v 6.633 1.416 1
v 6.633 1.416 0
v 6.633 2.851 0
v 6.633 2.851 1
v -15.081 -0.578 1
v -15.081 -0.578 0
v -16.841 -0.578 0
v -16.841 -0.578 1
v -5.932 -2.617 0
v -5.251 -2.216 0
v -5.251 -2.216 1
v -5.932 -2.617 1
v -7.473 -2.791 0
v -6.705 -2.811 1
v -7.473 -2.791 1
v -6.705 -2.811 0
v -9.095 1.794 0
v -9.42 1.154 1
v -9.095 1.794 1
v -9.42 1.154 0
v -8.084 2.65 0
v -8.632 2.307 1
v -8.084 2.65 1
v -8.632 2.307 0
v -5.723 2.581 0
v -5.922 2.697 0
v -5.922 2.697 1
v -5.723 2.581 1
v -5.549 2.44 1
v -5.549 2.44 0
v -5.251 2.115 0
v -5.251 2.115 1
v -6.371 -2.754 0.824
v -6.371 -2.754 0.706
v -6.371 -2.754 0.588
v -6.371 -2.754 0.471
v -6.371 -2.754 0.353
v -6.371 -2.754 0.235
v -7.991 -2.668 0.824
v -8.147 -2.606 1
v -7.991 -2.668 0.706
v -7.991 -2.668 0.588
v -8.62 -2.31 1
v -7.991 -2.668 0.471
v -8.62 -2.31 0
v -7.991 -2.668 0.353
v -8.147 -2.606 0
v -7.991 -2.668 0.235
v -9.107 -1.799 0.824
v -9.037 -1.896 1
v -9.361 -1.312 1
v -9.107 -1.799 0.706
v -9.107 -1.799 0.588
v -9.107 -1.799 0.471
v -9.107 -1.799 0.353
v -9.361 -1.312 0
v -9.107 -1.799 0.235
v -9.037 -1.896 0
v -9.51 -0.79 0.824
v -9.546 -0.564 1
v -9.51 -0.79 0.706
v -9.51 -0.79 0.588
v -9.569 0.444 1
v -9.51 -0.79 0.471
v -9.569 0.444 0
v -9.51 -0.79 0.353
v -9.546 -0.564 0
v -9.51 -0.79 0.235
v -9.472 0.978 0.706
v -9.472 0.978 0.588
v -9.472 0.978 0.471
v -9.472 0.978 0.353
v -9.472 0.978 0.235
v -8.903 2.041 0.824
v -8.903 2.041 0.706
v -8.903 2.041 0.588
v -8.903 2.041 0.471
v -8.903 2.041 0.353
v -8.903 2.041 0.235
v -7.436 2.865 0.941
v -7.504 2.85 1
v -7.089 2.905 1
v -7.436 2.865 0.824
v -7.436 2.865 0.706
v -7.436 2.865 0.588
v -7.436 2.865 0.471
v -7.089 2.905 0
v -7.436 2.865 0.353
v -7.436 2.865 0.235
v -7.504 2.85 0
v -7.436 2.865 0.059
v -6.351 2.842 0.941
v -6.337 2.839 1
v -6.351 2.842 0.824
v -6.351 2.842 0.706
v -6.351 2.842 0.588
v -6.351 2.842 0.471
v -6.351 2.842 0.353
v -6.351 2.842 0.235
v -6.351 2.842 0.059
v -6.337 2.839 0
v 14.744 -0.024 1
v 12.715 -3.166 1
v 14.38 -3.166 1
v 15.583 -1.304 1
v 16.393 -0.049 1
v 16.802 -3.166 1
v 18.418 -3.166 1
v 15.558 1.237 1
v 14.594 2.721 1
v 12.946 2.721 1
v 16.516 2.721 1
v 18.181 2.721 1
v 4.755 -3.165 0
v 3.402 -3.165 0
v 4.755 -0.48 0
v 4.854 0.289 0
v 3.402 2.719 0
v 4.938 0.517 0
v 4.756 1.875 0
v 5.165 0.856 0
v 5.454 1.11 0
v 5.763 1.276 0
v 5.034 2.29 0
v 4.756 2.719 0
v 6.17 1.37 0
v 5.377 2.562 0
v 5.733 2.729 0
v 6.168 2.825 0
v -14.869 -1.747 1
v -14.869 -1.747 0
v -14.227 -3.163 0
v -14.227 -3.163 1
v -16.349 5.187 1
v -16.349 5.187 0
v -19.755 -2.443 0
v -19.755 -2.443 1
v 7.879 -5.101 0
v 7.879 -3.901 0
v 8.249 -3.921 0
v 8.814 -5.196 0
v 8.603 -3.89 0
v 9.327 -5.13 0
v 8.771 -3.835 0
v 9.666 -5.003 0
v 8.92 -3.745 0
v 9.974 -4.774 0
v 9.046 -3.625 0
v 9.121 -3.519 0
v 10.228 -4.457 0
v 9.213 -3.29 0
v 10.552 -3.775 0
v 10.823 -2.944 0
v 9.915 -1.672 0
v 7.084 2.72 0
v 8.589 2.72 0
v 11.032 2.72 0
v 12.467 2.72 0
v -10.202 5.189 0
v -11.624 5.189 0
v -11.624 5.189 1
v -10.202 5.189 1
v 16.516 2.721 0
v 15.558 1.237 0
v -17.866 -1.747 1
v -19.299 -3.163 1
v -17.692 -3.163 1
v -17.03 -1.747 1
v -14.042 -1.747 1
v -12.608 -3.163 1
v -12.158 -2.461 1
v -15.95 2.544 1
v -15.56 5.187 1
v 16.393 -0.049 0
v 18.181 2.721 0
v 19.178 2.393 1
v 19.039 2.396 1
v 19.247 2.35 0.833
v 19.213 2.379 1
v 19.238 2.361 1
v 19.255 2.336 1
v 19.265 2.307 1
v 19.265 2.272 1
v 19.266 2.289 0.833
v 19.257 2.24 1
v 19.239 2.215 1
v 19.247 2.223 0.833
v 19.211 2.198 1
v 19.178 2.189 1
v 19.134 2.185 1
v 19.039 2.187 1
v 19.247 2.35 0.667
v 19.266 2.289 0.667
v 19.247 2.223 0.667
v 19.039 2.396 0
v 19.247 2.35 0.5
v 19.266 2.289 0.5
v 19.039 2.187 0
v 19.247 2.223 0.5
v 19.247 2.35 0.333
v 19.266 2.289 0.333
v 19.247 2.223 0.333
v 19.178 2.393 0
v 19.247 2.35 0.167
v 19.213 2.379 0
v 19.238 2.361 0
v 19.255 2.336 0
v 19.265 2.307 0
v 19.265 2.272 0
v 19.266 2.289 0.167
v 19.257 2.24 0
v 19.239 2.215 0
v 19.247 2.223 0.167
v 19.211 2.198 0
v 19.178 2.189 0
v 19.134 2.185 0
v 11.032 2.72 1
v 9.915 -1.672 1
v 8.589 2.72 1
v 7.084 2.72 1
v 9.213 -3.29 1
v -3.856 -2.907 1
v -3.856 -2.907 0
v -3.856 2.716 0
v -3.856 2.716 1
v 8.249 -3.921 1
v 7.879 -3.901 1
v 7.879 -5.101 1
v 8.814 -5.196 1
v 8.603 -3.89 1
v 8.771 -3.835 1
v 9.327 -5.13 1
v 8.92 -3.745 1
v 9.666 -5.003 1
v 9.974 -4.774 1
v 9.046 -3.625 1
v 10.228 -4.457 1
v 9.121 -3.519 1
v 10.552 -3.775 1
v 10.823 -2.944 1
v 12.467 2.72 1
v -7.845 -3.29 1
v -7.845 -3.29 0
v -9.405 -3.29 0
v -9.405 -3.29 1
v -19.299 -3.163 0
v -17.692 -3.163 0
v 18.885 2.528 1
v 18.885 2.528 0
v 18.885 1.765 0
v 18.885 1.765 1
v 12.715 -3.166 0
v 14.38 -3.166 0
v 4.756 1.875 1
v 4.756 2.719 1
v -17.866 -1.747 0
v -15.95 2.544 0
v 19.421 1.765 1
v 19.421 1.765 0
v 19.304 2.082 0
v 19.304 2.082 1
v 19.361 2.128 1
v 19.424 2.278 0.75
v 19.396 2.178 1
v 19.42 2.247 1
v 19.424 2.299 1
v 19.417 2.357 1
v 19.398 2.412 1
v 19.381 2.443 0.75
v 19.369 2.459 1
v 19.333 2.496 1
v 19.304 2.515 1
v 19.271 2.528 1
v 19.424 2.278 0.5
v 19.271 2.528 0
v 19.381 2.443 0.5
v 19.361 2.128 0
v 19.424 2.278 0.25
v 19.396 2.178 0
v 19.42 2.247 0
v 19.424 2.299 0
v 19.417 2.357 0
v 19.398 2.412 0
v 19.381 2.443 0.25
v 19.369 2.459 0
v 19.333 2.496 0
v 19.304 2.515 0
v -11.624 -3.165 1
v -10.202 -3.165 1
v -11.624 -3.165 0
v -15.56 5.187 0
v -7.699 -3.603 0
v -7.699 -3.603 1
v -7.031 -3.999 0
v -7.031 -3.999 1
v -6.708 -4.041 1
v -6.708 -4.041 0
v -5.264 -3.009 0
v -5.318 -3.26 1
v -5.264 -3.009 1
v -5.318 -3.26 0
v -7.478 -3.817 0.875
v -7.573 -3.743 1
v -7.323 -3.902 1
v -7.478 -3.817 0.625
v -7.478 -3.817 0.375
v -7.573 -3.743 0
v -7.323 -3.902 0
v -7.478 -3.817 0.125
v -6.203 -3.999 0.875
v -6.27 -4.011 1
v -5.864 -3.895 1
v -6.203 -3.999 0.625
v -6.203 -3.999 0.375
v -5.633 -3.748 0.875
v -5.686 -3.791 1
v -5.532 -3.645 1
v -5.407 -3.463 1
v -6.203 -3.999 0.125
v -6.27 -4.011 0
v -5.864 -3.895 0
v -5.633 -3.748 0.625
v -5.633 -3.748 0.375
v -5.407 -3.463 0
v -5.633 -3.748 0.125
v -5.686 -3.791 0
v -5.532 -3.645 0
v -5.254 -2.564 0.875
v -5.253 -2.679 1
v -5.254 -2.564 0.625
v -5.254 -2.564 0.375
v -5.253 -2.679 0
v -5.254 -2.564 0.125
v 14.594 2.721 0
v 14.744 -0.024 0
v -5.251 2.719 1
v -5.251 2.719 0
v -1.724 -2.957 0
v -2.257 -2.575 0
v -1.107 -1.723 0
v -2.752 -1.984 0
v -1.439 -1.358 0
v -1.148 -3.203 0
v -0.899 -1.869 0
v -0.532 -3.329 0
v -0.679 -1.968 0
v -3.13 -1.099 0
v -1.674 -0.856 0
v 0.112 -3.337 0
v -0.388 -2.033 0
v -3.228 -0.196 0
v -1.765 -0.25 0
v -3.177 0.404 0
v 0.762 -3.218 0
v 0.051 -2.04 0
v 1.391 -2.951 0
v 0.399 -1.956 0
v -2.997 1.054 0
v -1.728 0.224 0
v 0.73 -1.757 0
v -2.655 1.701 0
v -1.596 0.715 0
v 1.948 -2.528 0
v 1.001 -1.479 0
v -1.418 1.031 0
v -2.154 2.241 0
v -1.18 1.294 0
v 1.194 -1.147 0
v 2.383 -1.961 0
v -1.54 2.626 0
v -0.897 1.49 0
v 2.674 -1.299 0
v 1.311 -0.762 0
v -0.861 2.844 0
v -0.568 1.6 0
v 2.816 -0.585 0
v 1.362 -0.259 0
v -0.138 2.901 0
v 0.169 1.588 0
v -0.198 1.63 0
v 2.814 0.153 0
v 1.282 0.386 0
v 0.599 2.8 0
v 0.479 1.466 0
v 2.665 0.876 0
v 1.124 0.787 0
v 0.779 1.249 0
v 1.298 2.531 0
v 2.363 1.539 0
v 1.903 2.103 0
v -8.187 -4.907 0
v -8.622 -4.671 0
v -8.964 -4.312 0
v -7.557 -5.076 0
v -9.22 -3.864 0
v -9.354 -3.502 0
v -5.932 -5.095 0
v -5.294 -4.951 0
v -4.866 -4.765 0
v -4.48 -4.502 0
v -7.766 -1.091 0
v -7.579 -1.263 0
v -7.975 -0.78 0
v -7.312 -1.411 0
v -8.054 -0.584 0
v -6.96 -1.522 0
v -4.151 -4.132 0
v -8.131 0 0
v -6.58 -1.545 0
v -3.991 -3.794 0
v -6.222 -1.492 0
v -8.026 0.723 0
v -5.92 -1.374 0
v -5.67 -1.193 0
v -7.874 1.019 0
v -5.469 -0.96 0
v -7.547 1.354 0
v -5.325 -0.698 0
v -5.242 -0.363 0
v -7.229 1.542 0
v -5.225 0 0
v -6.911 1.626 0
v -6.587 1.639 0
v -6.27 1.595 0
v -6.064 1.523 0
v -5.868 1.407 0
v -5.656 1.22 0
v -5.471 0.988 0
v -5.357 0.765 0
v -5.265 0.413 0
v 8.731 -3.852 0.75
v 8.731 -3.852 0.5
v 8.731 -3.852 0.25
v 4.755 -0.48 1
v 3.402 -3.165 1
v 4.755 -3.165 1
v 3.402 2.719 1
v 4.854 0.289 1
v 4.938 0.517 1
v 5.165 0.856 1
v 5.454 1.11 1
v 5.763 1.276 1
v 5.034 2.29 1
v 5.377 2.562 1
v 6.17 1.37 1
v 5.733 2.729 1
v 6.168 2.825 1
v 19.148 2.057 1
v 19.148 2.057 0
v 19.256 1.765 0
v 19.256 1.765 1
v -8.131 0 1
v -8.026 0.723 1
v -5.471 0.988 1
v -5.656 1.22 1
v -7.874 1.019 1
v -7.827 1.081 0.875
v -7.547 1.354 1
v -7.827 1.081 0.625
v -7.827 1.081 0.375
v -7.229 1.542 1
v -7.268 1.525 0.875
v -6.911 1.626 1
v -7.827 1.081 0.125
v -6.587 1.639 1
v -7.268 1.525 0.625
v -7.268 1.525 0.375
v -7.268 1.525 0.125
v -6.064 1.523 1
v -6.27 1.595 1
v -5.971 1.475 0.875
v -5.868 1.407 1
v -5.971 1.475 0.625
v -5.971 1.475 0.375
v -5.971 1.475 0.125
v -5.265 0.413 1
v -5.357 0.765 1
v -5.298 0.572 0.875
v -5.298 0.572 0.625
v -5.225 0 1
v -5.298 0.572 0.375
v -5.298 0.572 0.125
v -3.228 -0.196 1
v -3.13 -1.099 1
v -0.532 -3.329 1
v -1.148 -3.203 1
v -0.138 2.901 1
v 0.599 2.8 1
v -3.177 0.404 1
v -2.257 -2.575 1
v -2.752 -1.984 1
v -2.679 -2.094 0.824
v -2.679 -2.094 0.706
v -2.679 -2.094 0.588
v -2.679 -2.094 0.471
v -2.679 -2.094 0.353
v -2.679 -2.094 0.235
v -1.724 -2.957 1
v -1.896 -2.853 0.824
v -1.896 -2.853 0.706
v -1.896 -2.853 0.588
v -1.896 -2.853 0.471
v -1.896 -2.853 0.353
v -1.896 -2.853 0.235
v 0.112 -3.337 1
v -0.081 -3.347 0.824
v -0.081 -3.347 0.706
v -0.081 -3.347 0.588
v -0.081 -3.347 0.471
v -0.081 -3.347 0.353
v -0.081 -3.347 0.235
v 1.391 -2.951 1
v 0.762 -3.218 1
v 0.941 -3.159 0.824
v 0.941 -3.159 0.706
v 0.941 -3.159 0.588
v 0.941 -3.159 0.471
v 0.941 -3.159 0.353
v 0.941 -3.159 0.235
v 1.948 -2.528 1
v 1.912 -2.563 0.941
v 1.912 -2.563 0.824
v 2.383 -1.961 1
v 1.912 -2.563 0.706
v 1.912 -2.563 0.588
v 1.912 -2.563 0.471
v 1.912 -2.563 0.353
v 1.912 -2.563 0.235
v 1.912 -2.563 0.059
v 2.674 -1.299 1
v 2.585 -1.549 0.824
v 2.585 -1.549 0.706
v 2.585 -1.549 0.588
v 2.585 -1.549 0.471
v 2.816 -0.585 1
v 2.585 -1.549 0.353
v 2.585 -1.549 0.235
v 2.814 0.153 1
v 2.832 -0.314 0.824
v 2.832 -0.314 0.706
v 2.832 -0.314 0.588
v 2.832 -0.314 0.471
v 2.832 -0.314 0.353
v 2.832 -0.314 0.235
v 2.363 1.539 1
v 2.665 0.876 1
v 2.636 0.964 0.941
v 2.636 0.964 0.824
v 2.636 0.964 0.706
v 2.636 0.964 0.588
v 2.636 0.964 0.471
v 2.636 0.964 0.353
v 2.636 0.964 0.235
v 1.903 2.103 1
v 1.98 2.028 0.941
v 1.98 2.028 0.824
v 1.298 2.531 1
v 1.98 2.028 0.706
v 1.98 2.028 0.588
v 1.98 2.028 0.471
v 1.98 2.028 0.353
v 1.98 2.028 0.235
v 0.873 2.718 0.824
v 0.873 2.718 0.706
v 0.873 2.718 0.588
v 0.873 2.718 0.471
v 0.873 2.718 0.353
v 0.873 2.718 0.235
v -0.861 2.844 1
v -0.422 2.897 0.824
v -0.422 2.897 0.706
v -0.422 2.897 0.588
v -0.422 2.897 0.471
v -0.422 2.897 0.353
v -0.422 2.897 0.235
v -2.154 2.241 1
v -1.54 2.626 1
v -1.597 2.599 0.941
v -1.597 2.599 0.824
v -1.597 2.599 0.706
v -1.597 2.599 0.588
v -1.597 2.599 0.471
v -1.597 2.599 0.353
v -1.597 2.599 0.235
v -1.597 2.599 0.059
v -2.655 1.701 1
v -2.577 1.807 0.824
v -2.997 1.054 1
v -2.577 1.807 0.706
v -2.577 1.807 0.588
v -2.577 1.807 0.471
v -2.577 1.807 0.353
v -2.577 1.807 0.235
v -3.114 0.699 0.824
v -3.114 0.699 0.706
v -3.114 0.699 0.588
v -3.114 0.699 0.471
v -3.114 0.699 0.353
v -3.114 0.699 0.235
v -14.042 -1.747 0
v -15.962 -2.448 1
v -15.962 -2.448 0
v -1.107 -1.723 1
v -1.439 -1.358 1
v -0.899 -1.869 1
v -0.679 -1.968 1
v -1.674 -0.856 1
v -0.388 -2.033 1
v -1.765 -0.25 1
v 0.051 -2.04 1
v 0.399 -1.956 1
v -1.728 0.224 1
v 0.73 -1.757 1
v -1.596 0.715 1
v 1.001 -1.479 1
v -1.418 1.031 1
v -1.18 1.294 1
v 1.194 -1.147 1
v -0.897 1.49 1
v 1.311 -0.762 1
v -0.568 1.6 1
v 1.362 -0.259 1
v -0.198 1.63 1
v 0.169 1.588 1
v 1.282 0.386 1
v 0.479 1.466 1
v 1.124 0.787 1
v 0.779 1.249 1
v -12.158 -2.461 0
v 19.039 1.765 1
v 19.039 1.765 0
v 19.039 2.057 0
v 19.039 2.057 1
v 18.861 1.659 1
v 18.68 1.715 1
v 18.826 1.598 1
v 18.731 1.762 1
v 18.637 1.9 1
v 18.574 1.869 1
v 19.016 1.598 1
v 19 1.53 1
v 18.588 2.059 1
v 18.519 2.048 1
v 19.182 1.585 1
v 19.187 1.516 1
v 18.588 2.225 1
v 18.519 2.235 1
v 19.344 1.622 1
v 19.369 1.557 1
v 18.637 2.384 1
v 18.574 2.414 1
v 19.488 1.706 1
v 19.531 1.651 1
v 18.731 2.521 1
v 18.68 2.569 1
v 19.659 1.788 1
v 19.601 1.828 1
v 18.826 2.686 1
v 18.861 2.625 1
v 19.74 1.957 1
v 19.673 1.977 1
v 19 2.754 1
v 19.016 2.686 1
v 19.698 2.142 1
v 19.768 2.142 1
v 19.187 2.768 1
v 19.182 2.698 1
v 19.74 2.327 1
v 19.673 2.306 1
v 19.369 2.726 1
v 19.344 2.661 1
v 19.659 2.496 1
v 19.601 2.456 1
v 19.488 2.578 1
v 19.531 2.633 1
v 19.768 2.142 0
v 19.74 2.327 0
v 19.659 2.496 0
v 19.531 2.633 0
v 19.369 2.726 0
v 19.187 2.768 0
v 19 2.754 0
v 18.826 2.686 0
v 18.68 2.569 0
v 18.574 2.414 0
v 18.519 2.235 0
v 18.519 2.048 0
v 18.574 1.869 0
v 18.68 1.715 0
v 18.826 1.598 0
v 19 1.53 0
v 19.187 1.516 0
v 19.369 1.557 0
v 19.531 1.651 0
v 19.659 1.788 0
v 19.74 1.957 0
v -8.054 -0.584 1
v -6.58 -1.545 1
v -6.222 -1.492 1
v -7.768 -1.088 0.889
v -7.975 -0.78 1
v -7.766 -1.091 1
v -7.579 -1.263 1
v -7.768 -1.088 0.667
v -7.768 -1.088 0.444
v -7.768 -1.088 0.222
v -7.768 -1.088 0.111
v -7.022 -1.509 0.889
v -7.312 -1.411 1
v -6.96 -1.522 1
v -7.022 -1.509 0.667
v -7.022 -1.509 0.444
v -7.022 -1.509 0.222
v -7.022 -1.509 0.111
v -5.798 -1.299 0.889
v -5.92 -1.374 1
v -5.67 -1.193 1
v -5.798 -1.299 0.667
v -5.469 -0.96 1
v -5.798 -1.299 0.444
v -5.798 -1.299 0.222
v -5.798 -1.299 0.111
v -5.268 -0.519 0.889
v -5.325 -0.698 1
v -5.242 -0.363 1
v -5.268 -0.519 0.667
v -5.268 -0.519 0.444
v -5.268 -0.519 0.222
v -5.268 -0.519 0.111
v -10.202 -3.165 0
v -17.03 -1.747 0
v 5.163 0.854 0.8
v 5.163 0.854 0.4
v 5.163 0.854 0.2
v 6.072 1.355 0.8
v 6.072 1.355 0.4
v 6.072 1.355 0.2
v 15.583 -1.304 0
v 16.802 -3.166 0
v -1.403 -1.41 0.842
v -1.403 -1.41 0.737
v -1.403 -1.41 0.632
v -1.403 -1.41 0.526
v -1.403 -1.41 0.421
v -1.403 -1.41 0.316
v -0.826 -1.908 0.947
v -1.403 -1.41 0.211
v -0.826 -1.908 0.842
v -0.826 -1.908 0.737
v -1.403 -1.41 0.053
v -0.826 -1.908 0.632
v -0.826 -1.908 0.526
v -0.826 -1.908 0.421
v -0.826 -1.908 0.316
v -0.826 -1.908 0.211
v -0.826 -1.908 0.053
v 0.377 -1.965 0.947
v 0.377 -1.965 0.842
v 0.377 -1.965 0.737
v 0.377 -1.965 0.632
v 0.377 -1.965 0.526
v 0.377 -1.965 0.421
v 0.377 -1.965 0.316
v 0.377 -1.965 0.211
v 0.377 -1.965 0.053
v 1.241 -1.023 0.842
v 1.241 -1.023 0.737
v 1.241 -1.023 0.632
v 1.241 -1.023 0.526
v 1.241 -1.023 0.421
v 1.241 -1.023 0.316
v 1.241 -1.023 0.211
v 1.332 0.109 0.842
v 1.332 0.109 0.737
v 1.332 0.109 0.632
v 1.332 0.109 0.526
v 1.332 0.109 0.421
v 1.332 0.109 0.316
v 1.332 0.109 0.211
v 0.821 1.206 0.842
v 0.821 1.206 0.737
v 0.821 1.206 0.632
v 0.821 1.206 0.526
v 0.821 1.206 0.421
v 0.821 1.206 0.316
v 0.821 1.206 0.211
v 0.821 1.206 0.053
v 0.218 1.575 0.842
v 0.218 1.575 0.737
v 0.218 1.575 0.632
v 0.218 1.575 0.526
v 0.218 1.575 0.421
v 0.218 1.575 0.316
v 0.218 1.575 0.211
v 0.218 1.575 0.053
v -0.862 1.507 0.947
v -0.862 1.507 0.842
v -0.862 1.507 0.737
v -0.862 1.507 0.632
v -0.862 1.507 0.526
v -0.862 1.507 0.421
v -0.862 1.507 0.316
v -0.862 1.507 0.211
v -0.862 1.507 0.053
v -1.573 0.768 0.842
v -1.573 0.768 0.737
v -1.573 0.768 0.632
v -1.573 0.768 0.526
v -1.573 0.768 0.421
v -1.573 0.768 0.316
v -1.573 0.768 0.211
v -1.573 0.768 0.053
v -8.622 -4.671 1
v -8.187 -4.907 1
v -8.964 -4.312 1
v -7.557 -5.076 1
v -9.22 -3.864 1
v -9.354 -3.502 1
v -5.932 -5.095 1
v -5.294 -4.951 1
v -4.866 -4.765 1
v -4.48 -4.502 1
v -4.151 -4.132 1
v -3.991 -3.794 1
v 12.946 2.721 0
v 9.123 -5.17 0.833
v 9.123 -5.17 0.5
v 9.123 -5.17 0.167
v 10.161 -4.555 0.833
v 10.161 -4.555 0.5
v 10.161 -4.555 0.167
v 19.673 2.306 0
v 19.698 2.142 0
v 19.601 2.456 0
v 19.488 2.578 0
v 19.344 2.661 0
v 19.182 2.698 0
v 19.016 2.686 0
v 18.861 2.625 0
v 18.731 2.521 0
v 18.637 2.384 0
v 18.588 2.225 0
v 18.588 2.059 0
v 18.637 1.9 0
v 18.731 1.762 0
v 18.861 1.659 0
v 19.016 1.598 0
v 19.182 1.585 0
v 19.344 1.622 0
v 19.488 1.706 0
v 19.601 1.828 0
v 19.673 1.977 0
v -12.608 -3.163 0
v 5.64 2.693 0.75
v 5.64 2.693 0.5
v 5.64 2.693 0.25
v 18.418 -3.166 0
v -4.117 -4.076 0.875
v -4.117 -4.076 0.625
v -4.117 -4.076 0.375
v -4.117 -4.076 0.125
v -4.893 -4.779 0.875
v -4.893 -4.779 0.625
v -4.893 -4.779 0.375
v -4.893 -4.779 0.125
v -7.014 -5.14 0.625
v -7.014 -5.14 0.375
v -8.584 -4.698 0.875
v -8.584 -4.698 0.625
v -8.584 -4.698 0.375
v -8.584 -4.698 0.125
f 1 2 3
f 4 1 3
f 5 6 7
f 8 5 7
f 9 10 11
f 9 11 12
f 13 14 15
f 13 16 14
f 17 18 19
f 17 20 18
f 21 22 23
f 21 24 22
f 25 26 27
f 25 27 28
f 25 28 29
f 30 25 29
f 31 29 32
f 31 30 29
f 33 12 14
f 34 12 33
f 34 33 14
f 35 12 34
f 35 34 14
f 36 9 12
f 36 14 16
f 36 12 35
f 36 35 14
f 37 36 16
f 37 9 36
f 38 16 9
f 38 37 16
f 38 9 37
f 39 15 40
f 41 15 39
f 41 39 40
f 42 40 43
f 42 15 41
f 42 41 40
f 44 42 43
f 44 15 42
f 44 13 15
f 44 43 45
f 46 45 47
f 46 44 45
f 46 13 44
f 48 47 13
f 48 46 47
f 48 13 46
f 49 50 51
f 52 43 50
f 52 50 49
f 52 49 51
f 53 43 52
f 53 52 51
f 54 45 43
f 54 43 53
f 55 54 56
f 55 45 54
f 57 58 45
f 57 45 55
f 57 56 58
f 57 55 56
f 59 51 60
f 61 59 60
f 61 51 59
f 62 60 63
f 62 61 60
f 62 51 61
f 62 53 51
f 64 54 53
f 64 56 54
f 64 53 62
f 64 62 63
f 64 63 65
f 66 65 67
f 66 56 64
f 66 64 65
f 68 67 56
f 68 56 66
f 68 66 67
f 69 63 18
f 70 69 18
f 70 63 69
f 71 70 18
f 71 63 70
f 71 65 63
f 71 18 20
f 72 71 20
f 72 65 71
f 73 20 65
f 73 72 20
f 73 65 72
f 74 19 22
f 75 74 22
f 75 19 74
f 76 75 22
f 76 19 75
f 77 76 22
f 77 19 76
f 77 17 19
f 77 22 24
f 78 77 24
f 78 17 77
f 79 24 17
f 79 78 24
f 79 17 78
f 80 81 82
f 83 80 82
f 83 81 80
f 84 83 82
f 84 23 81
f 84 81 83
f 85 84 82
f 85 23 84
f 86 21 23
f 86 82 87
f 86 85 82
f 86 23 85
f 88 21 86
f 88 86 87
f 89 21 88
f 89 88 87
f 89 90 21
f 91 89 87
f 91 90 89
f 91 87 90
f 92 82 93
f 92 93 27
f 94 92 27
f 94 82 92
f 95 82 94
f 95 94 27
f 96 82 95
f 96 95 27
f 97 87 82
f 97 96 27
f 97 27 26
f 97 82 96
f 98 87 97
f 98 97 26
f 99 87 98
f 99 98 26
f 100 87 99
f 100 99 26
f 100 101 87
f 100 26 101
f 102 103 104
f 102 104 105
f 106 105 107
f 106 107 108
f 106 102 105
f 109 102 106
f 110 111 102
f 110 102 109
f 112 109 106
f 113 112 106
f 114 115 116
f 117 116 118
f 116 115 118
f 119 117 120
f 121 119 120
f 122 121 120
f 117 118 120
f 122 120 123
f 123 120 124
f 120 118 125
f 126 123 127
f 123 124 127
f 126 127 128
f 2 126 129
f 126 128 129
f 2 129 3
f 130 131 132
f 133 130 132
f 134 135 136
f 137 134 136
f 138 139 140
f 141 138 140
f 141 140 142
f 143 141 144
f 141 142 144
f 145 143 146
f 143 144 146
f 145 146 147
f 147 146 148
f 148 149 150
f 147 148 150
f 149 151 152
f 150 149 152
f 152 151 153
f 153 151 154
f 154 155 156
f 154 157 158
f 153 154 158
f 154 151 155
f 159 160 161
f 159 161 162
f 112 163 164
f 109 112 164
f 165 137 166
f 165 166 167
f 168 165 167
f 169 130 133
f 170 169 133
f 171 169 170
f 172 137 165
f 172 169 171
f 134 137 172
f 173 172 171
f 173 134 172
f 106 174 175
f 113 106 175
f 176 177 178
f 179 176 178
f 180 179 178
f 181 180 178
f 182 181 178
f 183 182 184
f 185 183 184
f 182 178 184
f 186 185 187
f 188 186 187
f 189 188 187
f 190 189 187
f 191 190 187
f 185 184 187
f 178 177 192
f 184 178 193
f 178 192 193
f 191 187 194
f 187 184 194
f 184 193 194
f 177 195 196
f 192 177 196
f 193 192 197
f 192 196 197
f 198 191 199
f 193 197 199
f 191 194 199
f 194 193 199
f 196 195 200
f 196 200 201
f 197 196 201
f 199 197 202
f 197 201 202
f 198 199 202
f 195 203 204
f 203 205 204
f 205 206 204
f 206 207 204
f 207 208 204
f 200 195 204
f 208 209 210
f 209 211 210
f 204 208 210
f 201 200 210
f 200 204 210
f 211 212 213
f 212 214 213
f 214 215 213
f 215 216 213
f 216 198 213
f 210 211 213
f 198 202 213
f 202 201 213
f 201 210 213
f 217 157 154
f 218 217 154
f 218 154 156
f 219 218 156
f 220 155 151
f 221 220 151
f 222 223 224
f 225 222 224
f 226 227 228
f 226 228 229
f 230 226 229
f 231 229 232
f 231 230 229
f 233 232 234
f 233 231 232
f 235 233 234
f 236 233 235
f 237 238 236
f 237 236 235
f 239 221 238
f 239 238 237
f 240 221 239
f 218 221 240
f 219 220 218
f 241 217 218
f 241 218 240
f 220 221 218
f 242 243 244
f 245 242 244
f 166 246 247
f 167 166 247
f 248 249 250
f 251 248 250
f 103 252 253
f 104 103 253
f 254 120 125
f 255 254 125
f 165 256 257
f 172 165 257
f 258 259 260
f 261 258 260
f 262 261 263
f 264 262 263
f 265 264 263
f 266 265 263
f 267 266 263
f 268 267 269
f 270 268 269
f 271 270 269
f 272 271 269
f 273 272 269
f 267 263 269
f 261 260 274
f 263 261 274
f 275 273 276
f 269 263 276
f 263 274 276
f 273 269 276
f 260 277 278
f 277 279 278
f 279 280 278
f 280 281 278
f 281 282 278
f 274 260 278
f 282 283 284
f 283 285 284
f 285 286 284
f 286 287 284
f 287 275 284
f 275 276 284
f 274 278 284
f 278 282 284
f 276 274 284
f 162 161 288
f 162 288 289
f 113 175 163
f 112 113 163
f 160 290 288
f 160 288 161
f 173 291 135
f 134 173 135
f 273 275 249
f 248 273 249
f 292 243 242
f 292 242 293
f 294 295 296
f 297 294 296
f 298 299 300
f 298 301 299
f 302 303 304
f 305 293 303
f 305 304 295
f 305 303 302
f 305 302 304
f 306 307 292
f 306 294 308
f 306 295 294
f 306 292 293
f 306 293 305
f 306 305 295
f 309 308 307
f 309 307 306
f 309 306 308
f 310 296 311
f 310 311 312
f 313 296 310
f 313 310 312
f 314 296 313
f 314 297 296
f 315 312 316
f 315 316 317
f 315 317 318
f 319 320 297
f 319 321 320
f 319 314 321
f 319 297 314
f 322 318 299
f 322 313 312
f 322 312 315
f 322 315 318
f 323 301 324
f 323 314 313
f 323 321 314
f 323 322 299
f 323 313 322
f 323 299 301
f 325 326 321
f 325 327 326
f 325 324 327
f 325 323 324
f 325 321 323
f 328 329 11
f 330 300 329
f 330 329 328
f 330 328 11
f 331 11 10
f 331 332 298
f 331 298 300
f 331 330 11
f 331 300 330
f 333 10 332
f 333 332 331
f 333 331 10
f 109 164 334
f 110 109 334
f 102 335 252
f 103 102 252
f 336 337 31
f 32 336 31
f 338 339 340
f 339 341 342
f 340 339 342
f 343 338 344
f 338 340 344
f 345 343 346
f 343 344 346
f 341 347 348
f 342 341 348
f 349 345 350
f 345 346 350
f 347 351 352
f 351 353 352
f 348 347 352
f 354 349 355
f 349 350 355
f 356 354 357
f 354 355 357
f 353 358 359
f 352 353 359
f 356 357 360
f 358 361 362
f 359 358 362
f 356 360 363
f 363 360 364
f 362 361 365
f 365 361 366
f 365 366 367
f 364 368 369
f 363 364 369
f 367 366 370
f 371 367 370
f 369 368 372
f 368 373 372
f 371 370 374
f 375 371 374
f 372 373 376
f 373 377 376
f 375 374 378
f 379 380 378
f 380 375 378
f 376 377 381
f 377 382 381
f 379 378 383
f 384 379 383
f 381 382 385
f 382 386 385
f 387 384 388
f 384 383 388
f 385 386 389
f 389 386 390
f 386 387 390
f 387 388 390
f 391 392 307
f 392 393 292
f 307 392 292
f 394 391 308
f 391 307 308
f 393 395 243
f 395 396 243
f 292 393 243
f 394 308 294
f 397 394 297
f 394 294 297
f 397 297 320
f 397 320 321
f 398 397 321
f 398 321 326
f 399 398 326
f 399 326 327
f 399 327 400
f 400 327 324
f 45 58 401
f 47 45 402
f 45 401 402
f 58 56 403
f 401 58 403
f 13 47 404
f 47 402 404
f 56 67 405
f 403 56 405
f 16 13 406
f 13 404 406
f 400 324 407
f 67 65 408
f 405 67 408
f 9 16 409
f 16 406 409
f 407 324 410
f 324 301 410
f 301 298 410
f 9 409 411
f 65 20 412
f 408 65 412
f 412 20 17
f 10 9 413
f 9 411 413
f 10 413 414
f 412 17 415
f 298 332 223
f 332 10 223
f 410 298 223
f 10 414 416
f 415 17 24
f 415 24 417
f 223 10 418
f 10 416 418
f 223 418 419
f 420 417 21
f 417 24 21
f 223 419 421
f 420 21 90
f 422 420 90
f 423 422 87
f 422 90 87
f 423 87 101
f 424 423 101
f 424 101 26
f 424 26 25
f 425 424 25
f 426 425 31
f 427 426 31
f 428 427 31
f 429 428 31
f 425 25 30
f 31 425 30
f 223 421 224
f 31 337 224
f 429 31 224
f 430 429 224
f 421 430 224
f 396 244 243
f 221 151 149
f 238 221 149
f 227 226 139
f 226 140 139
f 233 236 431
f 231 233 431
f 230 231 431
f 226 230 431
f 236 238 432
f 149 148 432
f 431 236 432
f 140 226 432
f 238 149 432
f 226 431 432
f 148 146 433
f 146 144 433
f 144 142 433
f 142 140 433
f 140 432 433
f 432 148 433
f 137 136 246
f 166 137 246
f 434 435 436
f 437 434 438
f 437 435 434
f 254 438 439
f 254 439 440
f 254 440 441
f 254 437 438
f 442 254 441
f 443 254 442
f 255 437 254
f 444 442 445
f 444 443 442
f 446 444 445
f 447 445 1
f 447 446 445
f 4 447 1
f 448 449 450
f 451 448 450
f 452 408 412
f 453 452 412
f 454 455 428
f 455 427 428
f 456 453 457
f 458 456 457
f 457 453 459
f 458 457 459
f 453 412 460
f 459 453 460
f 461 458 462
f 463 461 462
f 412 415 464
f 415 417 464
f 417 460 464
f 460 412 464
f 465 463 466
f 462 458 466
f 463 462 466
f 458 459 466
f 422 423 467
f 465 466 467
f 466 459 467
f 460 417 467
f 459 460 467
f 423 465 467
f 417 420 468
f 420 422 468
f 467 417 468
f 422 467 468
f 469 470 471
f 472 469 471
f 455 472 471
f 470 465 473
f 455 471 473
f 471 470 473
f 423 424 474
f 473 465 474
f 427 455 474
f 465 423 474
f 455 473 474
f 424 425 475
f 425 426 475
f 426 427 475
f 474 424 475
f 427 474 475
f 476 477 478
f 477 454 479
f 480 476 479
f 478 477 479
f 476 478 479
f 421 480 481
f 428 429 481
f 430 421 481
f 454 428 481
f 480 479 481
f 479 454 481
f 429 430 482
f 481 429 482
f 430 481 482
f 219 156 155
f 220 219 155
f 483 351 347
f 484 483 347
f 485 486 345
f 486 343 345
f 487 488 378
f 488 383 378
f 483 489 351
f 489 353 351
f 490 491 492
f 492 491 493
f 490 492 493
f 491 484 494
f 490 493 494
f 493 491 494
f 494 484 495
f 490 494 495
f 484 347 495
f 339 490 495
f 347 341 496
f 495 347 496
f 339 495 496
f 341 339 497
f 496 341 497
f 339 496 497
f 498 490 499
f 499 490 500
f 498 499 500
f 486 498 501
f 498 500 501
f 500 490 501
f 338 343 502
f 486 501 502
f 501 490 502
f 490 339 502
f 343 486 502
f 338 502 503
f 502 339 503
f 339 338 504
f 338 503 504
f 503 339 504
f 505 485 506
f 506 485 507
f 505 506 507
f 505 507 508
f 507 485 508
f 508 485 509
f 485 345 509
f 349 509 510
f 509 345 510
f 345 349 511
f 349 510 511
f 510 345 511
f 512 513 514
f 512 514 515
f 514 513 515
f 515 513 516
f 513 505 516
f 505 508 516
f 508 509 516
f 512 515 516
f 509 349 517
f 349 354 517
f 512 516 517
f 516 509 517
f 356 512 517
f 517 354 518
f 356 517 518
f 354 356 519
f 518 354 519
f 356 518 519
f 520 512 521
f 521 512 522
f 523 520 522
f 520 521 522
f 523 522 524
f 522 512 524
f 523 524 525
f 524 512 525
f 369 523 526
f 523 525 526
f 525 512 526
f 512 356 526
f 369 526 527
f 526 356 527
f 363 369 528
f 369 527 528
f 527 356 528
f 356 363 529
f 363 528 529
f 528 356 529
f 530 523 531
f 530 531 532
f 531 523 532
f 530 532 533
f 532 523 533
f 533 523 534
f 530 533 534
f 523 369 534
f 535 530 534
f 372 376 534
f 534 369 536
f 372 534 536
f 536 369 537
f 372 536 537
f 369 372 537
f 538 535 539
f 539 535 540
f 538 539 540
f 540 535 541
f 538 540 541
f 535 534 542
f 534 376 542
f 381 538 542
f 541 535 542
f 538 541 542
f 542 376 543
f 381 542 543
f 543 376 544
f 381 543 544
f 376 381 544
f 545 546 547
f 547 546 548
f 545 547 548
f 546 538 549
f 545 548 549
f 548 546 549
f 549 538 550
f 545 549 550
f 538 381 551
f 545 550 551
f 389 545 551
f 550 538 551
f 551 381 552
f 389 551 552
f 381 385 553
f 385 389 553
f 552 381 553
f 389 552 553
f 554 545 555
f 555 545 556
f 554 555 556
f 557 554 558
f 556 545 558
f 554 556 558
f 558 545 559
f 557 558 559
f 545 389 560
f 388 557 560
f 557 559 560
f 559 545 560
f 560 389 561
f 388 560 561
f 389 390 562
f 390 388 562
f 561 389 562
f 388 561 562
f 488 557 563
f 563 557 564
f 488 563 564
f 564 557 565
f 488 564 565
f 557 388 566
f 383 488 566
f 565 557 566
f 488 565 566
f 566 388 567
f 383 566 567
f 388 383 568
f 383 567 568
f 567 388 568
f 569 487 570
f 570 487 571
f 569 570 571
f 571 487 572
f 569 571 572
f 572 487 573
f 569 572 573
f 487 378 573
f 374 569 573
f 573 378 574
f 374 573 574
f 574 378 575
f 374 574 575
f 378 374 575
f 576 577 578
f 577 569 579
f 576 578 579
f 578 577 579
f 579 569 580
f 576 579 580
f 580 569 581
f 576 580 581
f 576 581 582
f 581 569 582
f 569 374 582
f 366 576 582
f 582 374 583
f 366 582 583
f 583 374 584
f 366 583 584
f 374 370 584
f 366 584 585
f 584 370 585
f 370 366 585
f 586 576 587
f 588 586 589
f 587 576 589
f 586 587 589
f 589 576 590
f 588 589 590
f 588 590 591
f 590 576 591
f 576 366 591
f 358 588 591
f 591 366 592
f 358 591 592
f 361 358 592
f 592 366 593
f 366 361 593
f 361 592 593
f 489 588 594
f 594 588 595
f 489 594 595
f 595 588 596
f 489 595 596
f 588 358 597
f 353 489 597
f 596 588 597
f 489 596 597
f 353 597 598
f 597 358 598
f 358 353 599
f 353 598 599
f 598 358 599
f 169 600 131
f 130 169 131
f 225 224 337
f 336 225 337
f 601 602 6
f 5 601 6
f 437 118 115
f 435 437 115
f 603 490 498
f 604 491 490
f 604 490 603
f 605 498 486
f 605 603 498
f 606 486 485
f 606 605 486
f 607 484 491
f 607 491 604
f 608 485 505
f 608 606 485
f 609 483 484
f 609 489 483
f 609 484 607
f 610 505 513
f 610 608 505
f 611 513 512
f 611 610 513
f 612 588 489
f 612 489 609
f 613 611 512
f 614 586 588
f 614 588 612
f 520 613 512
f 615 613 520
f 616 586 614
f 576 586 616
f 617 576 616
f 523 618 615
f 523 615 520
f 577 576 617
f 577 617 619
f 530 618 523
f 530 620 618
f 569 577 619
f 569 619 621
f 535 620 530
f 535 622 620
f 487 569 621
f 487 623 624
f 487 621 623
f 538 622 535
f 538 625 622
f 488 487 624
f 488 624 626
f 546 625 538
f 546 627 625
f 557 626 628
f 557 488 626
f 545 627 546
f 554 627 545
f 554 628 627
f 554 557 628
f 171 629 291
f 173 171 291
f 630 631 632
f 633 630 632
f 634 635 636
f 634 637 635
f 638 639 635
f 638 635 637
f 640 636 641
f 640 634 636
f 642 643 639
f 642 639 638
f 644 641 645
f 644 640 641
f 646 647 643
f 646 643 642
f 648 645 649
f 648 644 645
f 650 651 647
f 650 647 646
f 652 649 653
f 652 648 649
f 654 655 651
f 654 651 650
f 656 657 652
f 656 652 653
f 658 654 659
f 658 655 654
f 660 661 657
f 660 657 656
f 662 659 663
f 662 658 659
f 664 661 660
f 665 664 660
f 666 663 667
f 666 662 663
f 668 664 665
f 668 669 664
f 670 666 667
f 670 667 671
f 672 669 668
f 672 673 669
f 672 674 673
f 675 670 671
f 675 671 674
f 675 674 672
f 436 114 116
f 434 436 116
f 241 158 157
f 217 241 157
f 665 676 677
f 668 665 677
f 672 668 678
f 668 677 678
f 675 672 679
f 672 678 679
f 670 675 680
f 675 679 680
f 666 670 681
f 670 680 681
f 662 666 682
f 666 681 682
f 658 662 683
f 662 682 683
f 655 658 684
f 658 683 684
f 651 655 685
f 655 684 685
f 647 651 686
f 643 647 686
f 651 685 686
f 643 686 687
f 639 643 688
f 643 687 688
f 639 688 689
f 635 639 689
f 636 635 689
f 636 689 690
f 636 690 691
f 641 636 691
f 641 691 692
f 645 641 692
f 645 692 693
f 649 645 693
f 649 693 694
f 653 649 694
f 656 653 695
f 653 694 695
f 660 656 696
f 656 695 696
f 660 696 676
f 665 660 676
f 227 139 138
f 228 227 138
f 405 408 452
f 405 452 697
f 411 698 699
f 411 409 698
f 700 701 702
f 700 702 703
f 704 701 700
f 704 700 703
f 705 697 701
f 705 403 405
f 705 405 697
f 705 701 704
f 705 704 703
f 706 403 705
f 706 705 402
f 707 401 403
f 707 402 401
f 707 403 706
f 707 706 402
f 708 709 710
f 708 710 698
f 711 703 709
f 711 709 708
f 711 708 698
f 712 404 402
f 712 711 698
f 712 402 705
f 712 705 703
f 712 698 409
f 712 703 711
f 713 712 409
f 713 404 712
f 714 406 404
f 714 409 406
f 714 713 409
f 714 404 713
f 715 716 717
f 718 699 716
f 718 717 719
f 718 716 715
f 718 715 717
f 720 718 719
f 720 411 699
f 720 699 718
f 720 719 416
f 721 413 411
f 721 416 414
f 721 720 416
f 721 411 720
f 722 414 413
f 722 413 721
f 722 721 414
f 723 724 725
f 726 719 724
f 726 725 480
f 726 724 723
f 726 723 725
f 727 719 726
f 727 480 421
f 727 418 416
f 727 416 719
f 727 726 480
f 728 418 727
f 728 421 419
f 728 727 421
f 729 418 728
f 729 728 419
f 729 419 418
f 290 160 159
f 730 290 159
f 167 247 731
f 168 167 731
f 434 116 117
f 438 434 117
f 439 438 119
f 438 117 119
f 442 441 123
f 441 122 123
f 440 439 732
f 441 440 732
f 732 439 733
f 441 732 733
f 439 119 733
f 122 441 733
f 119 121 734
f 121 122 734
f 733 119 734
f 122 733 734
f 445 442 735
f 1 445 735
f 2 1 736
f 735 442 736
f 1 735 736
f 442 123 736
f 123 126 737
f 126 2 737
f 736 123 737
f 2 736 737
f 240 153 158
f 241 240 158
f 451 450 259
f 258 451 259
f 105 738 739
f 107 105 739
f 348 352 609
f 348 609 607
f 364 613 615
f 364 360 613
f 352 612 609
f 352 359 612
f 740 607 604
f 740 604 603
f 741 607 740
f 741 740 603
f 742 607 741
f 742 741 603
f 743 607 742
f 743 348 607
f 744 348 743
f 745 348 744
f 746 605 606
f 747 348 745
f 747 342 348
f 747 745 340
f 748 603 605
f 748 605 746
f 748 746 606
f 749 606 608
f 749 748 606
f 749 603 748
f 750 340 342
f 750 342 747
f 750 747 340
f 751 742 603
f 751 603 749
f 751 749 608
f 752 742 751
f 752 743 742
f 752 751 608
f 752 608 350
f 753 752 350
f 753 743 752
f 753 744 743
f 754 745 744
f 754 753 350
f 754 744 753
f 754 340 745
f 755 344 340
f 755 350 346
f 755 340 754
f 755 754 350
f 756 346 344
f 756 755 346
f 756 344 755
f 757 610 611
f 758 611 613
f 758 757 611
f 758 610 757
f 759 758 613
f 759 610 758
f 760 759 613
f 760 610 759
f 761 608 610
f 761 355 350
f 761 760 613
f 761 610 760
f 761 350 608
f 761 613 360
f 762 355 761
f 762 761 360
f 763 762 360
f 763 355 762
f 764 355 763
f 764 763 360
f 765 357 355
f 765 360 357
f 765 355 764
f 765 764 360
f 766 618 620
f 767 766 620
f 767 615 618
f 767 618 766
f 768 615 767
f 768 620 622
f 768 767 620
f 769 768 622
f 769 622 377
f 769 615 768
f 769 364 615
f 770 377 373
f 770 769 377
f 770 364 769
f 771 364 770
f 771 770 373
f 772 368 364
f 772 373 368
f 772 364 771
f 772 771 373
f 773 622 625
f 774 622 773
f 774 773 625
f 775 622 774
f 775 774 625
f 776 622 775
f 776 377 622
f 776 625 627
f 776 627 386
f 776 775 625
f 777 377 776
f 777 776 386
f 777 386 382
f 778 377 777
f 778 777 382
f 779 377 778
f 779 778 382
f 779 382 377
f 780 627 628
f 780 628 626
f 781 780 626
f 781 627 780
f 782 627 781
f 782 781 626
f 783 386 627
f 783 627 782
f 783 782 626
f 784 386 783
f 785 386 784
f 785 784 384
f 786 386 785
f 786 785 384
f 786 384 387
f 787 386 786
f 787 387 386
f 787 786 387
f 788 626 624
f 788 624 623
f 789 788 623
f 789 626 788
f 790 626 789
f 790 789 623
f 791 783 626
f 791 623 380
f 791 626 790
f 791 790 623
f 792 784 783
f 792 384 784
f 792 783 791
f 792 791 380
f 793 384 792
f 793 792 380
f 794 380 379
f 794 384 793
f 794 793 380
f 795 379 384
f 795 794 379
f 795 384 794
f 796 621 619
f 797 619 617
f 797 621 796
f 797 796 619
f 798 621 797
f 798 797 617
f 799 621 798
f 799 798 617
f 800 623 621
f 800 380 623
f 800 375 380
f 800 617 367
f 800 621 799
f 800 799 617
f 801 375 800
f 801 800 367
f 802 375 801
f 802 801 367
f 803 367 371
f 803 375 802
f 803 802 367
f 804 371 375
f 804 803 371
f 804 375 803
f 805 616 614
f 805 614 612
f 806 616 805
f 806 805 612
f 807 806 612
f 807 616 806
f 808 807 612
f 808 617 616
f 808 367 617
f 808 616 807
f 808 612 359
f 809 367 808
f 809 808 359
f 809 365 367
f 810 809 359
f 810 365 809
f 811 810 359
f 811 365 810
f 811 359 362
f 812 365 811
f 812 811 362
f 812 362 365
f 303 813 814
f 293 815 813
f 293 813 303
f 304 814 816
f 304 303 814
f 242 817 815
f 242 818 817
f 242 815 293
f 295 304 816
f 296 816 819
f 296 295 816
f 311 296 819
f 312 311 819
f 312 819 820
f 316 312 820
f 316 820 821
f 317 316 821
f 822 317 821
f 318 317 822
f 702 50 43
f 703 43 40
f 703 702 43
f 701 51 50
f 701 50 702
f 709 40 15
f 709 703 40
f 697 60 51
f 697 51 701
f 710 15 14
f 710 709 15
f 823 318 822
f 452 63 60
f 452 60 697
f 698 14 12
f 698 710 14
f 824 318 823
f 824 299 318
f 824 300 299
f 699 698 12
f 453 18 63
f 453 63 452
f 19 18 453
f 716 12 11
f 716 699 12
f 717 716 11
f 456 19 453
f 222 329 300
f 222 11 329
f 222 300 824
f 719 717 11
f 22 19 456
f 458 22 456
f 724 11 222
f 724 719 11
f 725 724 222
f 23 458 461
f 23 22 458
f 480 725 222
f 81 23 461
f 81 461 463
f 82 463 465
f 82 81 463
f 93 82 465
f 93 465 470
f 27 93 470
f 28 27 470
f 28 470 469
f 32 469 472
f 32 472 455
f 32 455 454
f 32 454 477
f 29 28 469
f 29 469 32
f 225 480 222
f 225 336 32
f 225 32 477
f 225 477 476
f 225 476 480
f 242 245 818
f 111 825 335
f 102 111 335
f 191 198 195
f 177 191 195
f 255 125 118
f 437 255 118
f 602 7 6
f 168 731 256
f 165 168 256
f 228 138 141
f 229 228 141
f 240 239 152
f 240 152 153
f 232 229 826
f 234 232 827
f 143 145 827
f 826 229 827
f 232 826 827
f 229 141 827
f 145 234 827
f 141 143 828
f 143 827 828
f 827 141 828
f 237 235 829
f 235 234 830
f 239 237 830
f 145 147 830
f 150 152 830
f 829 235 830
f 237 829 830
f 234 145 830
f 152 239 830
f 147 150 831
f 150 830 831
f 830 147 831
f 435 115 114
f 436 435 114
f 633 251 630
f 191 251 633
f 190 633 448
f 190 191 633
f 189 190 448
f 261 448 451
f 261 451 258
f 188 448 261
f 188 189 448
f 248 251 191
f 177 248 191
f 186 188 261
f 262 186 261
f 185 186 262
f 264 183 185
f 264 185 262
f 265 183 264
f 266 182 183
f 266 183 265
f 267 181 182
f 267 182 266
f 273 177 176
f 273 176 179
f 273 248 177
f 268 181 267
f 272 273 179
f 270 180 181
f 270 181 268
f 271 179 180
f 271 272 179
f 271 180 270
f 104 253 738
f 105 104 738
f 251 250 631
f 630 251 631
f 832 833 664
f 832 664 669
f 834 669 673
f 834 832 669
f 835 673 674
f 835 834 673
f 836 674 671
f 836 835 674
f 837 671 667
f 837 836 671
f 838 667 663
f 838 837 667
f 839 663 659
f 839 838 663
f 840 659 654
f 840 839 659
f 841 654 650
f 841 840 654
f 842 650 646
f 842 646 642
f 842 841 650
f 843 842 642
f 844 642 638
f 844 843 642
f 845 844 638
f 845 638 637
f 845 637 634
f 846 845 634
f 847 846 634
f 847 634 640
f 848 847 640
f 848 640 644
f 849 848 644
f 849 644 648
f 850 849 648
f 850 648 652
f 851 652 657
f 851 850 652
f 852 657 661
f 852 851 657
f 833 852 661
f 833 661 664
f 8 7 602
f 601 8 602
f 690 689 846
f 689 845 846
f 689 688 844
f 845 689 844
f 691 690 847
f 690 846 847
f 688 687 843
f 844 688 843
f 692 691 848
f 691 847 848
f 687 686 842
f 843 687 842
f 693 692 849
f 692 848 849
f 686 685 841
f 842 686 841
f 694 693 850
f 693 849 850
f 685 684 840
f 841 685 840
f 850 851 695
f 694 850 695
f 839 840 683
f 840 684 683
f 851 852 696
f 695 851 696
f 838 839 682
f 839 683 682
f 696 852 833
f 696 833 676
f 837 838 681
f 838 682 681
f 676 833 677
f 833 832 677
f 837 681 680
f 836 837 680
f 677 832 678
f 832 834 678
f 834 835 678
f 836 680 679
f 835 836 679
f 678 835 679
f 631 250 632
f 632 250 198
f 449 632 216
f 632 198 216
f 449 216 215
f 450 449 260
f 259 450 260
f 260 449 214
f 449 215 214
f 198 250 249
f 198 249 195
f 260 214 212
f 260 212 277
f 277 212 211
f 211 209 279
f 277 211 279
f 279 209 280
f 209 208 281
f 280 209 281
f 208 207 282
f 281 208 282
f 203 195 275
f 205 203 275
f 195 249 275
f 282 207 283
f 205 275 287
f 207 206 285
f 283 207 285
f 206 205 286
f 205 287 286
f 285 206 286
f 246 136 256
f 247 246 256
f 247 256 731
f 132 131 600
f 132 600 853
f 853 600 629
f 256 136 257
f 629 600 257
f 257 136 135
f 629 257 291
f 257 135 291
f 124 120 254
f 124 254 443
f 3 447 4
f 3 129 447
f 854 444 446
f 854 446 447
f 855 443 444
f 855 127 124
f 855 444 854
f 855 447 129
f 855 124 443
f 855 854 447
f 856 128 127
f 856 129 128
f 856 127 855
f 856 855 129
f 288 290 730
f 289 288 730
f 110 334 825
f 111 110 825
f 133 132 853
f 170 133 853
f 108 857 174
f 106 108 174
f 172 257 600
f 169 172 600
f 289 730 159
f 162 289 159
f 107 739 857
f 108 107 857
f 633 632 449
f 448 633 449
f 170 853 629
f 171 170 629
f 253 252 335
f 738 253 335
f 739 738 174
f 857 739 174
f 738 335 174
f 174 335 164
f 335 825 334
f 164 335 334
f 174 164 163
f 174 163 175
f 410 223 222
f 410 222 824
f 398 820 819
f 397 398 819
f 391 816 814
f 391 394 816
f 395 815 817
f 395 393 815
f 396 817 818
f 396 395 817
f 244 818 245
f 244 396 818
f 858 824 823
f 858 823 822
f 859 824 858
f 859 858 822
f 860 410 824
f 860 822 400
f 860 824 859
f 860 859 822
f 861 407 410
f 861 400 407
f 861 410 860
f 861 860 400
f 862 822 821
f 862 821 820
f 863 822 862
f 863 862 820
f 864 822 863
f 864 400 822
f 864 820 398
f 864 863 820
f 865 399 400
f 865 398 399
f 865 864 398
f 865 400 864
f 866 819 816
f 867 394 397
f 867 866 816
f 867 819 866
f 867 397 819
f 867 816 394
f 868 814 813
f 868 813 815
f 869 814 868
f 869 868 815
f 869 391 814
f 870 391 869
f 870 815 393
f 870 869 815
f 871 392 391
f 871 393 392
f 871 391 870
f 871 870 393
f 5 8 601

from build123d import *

# Parameters (mm, degrees)
F1_DEPTH = 1
F0_W     = 1.4222441241
F0_H     = 8.3537010942
F0_R     = 0.6279237331
F0_R_2   = 0.5579662235


with BuildPart() as f1:
    # F0 (on Top) → F1 (new body)
    with BuildSketch(Plane.XY):
        Polygon((-16.3488443941, 5.1873927005), (-19.7549946606, -2.4434113875), (-19.2986354232, -3.1626098789), (-17.6923759282, -3.1626098789), (-17.0299634337, -1.7472400796), (-17.8658995365, -1.7472400796), (-15.9504826335, 2.5438715831), (-14.0423420817, -1.7472400796), (-14.868805185, -1.7472400796), (-14.2271183431, -3.1626098789), (-12.6078501344, -3.1626098789), (-12.1584273875, -2.4611647241), (-15.5595326796, 5.1873927005), align=None)
    extrude(amount=F1_DEPTH)


with BuildPart() as f1b:
    # F0 (on Top) → F1, piece 2 (new body)
    with BuildSketch(Plane.XY):
        Polygon((-15.0812519714, -0.5779869971), (-16.8408062309, -0.5779869971), (-15.9615054727, -2.4477490224), align=None)
    extrude(amount=F1_DEPTH)


with BuildPart() as f1c:
    # F0 (on Top) → F1, piece 3 (new body)
    with BuildSketch(Plane.XY):
        with Locations((-10.9128146432, 1.0118944338)):
            Rectangle(F0_W, F0_H)
    extrude(amount=F1_DEPTH)


with BuildPart() as f1d:
    # F0 (on Top) → F1, piece 4 (new body)
    with BuildSketch(Plane.XY):
        with BuildLine():
            Line((-3.8558838423, -2.9073522892), (-3.8558838423, 2.7157925069))
            Line((-3.8558838423, 2.7157925069), (-5.250770133, 2.7191238478))
            Line((-5.250770133, 2.7191238478), (-5.250770133, 2.114744857))
            add(Edge.make_bspline(
                [(-5.250770133, -2.21574842), (-5.3920497055, -2.3193948492), (-5.6946541855, -2.5413934954), (-6.3790656755, -2.7866941034), (-7.1051137086, -2.8602071713), (-8.0102576587, -2.7169133708), (-8.6015221372, -2.3544268543), (-9.1727736402, -1.8164485211), (-9.5852897605, -0.8186467774), (-9.6033932944, 0.4374854815), (-9.4794880443, 0.9700036227), (-9.3367298672, 1.4304664875), (-8.9244721778, 2.0867692527), (-8.2561392645, 2.6313242637), (-7.4377129187, 2.8831253052), (-7.0734814674, 2.9149319819), (-6.3262880802, 2.8850689099), (-5.6641554038, 2.6030605841), (-5.3853377112, 2.2737042332), (-5.250770133, 2.114744857)],
                knots=[0, 0, 0, 0, 0.0509808047, 0.1091949785, 0.1688688096, 0.2342796744, 0.2914313499, 0.3512568062, 0.423367386, 0.5006161822, 0.5510785071, 0.5979317658, 0.6580649527, 0.7233611476, 0.7858093604, 0.8279922974, 0.8866651967, 0.9453004942, 1, 1, 1, 1], degree=3))
            add(Edge.make_bspline(
                [(-7.8452127054, -3.2898520585), (-7.8117121152, -3.3831675635), (-7.7435240544, -3.5730925913), (-7.4874653887, -3.8554136407), (-6.9104396614, -4.0701135923), (-6.198994273, -4.0312870769), (-5.5879318648, -3.8138385071), (-5.2278102971, -3.1809543087), (-5.2632398781, -2.6049119269), (-5.2475925603, -2.2731449662), (-5.250770133, -2.21574842)],
                knots=[0, 0, 0, 0, 0.0943787743, 0.1989056201, 0.3336805651, 0.4809450615, 0.6184027203, 0.7611149971, 0.8970689785, 1, 1, 1, 1], degree=3))
            Line((-7.8452127054, -3.2898520585), (-9.4050969929, -3.2898520585))
            add(Edge.make_bspline(
                [(-3.8558838423, -2.9073522892), (-3.8733207039, -3.3527132004), (-3.9847479517, -4.1270394232), (-4.878725911, -4.8580095844), (-5.9263591333, -5.1508891121), (-7.0285458213, -5.145199471), (-7.2181353727, -5.1233724342), (-8.7880057279, -4.9396309996), (-9.3461702362, -3.6012559191), (-9.3878459006, -3.3657068367), (-9.4050969929, -3.2898520585)],
                knots=[0, 0, 0, 0, 0.1447795052, 0.2801848671, 0.4224935274, 0.5555703208, 0.6172598715, 0.7748721933, 0.9288727709, 1, 1, 1, 1], degree=3))
        make_face()
        with BuildLine():
            add(Edge.make_bspline(
                [(-8.130852133, 0), (-8.1174517692, -0.2266994074), (-8.0922989215, -0.6522203652), (-7.7747844028, -1.0973844852), (-7.5714079052, -1.2904753987), (-7.0187293496, -1.5709833132), (-6.2923449024, -1.5490754637), (-5.7835136304, -1.3329298922), (-5.4385998399, -0.9580923995), (-5.2325266516, -0.5250447511), (-5.2272733379, -0.1782186411), (-5.2245738916, 0)],
                knots=[0, 0, 0, 0, 0.1248302671, 0.2343098089, 0.315203217, 0.4330322213, 0.5639285508, 0.6767522551, 0.7842696143, 0.8891456697, 1, 1, 1, 1], degree=3))
            add(Edge.make_bspline(
                [(-8.130852133, 0), (-8.1169884446, 0.2178751829), (-8.090597805, 0.632367112), (-7.8605360694, 1.1056345486), (-7.2902903611, 1.5944558185), (-6.6005338042, 1.6743826223), (-5.9458394278, 1.5451319124), (-5.4369448612, 1.0057929265), (-5.2829243885, 0.5782833878), (-5.2276432441, 0.2057098462), (-5.2245738916, 0)],
                knots=[0, 0, 0, 0, 0.1267402907, 0.2413208611, 0.3765308922, 0.5081145763, 0.6372987682, 0.7710294006, 0.8784094637, 1, 1, 1, 1], degree=3))
        make_face(mode=Mode.SUBTRACT)
    extrude(amount=F1_DEPTH)


with BuildPart() as f1e:
    # F0 (on Top) → F1, piece 5 (new body)
    with BuildSketch(Plane.XY):
        with BuildLine():
            add(Edge.make_bspline(
                [(-3.2284571789, -0.1961077651), (-3.2330784968, -0.4697769979), (-3.2013839352, -1.0458417207), (-2.7466966758, -2.1484963176), (-1.932272596, -2.8959996709), (-1.0483905846, -3.2809749107), (-0.074010286, -3.3931411197), (0.9683607812, -3.2216274357), (1.9812839464, -2.62643655), (2.662905825, -1.5724584623), (2.9036901636, -0.3160708099), (2.7171076738, 0.9904392799), (2.0547827019, 2.1022410894), (0.9030427317, 2.8092187506), (-0.4246596507, 2.974144101), (-1.6339206416, 2.6809134144), (-2.6548497466, 1.8786615956), (-3.1684669287, 0.7255080339), (-3.2236589148, 0.088040026), (-3.2284571789, -0.1961077651)],
                knots=[0, 0, 0, 0, 0.0504927178, 0.1100005383, 0.1676129359, 0.221158738, 0.2752299839, 0.331475023, 0.390372046, 0.4512307285, 0.5131529703, 0.5758826565, 0.6375828247, 0.7006046455, 0.7636828092, 0.8244420625, 0.8863699658, 0.9475739597, 1, 1, 1, 1], degree=3))
        make_face()
        with BuildLine():
            add(Edge.make_bspline(
                [(-1.7651357921, -0.2500803093), (-1.7626672265, -0.4227528248), (-1.7196902436, -0.8066936741), (-1.4487389326, -1.441417533), (-0.8564934896, -1.9674229799), (-0.2179672465, -2.0722982324), (0.3969886216, -2.0207090412), (0.9505707939, -1.6094257536), (1.2802270993, -1.0468676822), (1.3837137483, -0.3474192994), (1.3381658972, 0.1091701324), (1.2434352647, 0.6558673779), (0.8423905341, 1.2208932408), (0.5608336082, 1.4264035779), (0.2196076483, 1.6086303658), (-0.3570550031, 1.6536851158), (-0.8751832284, 1.5427851965), (-1.2859900169, 1.2273981133), (-1.6048865795, 0.7837137572), (-1.7394675052, 0.2348280637), (-1.7674655513, -0.0871170972), (-1.7651357921, -0.2500803093)],
                knots=[0, 0, 0, 0, 0.0518075624, 0.1098626073, 0.1711233063, 0.2267521635, 0.2809682141, 0.33779552, 0.3944840333, 0.4526599063, 0.5000413303, 0.5521680394, 0.6098955269, 0.6510391242, 0.6936686325, 0.7466979118, 0.7975743856, 0.8472216328, 0.8987682835, 0.9511055551, 1, 1, 1, 1], degree=3))
        make_face(mode=Mode.SUBTRACT)
    extrude(amount=F1_DEPTH)


with BuildPart() as f1f:
    # F0 (on Top) → F1, piece 6 (new body)
    with BuildSketch(Plane.XY):
        with BuildLine():
            Line((3.4016827121, 2.7188824024), (3.4016827121, -3.16482177))
            Line((3.4016827121, -3.16482177), (4.755126778, -3.16482177))
            Line((4.755126778, -3.16482177), (4.755126778, -0.4802318581))
            add(Edge.make_bspline(
                [(4.755126778, -0.4802318581), (4.7734483949, -0.2005050143), (4.8078021676, 0.3239941306), (5.1241682777, 0.8730966509), (5.6219692454, 1.2500119585), (6.0700671639, 1.3703092929), (6.4391946669, 1.3999928093), (6.633403711, 1.415610197)],
                knots=[0, 0, 0, 0, 0.2310006331, 0.4331355293, 0.6322488847, 0.8065151147, 1, 1, 1, 1], degree=3))
            Line((6.633403711, 1.415610197), (6.633403711, 2.8506107628))
            add(Edge.make_bspline(
                [(4.7564292327, 1.87528471), (4.8482313202, 2.038132891), (5.03929747, 2.3773686969), (5.6326295288, 2.7197582822), (6.1060922361, 2.8357739897), (6.4582264189, 2.8454822383), (6.633403711, 2.8506107628)],
                knots=[0, 0, 0, 0, 0.2524557041, 0.5242134823, 0.7585255327, 1, 1, 1, 1], degree=3))
            Line((4.7564292327, 1.87528471), (4.7564292327, 2.7188824024))
            Line((4.7564292327, 2.7188824024), (3.4016827121, 2.7188824024))
        make_face()
    extrude(amount=F1_DEPTH)


with BuildPart() as f1g:
    # F0 (on Top) → F1, piece 7 (new body)
    with BuildSketch(Plane.XY):
        with BuildLine():
            Line((8.5888998583, 2.7202325873), (7.0837903768, 2.7202325873))
            Line((7.0837903768, 2.7202325873), (9.2125628144, -3.2899719663))
            add(Edge.make_bspline(
                [(9.2125628144, -3.2899719663), (9.1787052334, -3.4279441923), (9.0564107605, -3.6601478459), (8.7385307716, -3.8821050174), (8.3303349143, -3.9352093426), (8.0326193943, -3.9127229171), (7.8785745427, -3.9008697495)],
                knots=[0, 0, 0, 0, 0.2474757346, 0.4853093506, 0.7343565434, 1, 1, 1, 1], degree=3))
            Line((7.8785745427, -3.9008697495), (7.8785745427, -5.1008067094))
            add(Edge.make_bspline(
                [(7.8785745427, -5.1008067094), (8.0552926395, -5.1497018894), (8.4073555488, -5.2008120982), (9.1296537108, -5.205693101), (9.7519877806, -5.01129371), (10.1973467616, -4.5645340348), (10.5297850486, -3.900793194), (10.7193582083, -3.2804695641), (10.8227310702, -2.9439320788)],
                knots=[0, 0, 0, 0, 0.14637953, 0.3148614575, 0.4742064011, 0.628421217, 0.7989654655, 1, 1, 1, 1], degree=3))
            Line((10.8227310702, -2.9439320788), (12.4670844525, 2.7202325873))
            Line((12.4670844525, 2.7202325873), (11.0321398824, 2.7202325873))
            Line((11.0321398824, 2.7202325873), (9.9153397605, -1.671714941))
            Line((9.9153397605, -1.671714941), (8.5888998583, 2.7202325873))
        make_face()
    extrude(amount=F1_DEPTH)


with BuildPart() as f1h:
    # F0 (on Top) → F1, piece 8 (new body)
    with BuildSketch(Plane.XY):
        Polygon((14.5939088581, 2.7210286353), (12.9459214934, 2.7210286353), (14.7437846061, -0.0236701289), (12.7147668973, -3.1663759146), (14.3803991377, -3.1663759146), (15.5826218096, -1.3042767667), (16.8023547049, -3.1663759146), (18.4175020033, -3.1663759146), (16.3929880867, -0.0491163132), (18.1814702228, 2.7210286353), (16.5158379823, 2.7210286353), (15.5577119585, 1.2370060044), align=None)
    extrude(amount=F1_DEPTH)


with BuildPart() as f1i:
    # F0 (on Top) → F1, piece 9 (new body)
    with BuildSketch(Plane.XY):
        with Locations((19.1399268806, 2.1418542601)):
            Circle(F0_R)
        with Locations((19.1399268806, 2.1418542601)):
            Circle(F0_R_2, mode=Mode.SUBTRACT)
    extrude(amount=F1_DEPTH)


with BuildPart() as f1j:
    # F0 (on Top) → F1, piece 10 (new body)
    with BuildSketch(Plane.XY):
        with BuildLine():
            Line((18.8851971179, 2.528425915), (18.8851971179, 1.7649914639))
            Line((18.8851971179, 1.7649914639), (19.0394744277, 1.7649914639))
            Line((19.0394744277, 1.7649914639), (19.0394744277, 2.0572288463))
            Line((19.0394744277, 2.0572288463), (19.1477070902, 2.0572288463))
            Line((19.1477070902, 2.0572288463), (19.2563701421, 1.7649914639))
            Line((19.2563701421, 1.7649914639), (19.4214078558, 1.7649914639))
            Line((19.4214078558, 1.7649914639), (19.3035937846, 2.081839511))
            add(Edge.make_bspline(
                [(19.3035937846, 2.081839511), (19.328685766, 2.1004080744), (19.3823016137, 2.1360033374), (19.4435686613, 2.2790132245), (19.3947284789, 2.4521662926), (19.3174499242, 2.5136443431), (19.2706417292, 2.528425915)],
                knots=[0, 0, 0, 0, 0.2067948108, 0.4654090403, 0.7458964616, 1, 1, 1, 1], degree=3))
            Line((19.2706417292, 2.528425915), (18.8851971179, 2.528425915))
        make_face()
        with BuildLine():
            add(Edge.make_bspline(
                [(19.0394744277, 2.3959446698), (19.0958790481, 2.3970727343), (19.1801648609, 2.4047670909), (19.2533160663, 2.3550875781), (19.2720919778, 2.2895888002), (19.2548474853, 2.2148438264), (19.1773387622, 2.1808686505), (19.0906815075, 2.1838072082), (19.0394744277, 2.1869585348)],
                knots=[0, 0, 0, 0, 0.2082389501, 0.3605272502, 0.4995256854, 0.6431459948, 0.7934412291, 1, 1, 1, 1], degree=3))
            Line((19.0394744277, 2.1869585348), (19.0394744277, 2.3959446698))
        make_face(mode=Mode.SUBTRACT)
    extrude(amount=F1_DEPTH)


solid = Compound([f1.part, f1b.part, f1c.part, f1d.part, f1e.part, f1f.part, f1g.part, f1h.part, f1i.part, f1j.part])
